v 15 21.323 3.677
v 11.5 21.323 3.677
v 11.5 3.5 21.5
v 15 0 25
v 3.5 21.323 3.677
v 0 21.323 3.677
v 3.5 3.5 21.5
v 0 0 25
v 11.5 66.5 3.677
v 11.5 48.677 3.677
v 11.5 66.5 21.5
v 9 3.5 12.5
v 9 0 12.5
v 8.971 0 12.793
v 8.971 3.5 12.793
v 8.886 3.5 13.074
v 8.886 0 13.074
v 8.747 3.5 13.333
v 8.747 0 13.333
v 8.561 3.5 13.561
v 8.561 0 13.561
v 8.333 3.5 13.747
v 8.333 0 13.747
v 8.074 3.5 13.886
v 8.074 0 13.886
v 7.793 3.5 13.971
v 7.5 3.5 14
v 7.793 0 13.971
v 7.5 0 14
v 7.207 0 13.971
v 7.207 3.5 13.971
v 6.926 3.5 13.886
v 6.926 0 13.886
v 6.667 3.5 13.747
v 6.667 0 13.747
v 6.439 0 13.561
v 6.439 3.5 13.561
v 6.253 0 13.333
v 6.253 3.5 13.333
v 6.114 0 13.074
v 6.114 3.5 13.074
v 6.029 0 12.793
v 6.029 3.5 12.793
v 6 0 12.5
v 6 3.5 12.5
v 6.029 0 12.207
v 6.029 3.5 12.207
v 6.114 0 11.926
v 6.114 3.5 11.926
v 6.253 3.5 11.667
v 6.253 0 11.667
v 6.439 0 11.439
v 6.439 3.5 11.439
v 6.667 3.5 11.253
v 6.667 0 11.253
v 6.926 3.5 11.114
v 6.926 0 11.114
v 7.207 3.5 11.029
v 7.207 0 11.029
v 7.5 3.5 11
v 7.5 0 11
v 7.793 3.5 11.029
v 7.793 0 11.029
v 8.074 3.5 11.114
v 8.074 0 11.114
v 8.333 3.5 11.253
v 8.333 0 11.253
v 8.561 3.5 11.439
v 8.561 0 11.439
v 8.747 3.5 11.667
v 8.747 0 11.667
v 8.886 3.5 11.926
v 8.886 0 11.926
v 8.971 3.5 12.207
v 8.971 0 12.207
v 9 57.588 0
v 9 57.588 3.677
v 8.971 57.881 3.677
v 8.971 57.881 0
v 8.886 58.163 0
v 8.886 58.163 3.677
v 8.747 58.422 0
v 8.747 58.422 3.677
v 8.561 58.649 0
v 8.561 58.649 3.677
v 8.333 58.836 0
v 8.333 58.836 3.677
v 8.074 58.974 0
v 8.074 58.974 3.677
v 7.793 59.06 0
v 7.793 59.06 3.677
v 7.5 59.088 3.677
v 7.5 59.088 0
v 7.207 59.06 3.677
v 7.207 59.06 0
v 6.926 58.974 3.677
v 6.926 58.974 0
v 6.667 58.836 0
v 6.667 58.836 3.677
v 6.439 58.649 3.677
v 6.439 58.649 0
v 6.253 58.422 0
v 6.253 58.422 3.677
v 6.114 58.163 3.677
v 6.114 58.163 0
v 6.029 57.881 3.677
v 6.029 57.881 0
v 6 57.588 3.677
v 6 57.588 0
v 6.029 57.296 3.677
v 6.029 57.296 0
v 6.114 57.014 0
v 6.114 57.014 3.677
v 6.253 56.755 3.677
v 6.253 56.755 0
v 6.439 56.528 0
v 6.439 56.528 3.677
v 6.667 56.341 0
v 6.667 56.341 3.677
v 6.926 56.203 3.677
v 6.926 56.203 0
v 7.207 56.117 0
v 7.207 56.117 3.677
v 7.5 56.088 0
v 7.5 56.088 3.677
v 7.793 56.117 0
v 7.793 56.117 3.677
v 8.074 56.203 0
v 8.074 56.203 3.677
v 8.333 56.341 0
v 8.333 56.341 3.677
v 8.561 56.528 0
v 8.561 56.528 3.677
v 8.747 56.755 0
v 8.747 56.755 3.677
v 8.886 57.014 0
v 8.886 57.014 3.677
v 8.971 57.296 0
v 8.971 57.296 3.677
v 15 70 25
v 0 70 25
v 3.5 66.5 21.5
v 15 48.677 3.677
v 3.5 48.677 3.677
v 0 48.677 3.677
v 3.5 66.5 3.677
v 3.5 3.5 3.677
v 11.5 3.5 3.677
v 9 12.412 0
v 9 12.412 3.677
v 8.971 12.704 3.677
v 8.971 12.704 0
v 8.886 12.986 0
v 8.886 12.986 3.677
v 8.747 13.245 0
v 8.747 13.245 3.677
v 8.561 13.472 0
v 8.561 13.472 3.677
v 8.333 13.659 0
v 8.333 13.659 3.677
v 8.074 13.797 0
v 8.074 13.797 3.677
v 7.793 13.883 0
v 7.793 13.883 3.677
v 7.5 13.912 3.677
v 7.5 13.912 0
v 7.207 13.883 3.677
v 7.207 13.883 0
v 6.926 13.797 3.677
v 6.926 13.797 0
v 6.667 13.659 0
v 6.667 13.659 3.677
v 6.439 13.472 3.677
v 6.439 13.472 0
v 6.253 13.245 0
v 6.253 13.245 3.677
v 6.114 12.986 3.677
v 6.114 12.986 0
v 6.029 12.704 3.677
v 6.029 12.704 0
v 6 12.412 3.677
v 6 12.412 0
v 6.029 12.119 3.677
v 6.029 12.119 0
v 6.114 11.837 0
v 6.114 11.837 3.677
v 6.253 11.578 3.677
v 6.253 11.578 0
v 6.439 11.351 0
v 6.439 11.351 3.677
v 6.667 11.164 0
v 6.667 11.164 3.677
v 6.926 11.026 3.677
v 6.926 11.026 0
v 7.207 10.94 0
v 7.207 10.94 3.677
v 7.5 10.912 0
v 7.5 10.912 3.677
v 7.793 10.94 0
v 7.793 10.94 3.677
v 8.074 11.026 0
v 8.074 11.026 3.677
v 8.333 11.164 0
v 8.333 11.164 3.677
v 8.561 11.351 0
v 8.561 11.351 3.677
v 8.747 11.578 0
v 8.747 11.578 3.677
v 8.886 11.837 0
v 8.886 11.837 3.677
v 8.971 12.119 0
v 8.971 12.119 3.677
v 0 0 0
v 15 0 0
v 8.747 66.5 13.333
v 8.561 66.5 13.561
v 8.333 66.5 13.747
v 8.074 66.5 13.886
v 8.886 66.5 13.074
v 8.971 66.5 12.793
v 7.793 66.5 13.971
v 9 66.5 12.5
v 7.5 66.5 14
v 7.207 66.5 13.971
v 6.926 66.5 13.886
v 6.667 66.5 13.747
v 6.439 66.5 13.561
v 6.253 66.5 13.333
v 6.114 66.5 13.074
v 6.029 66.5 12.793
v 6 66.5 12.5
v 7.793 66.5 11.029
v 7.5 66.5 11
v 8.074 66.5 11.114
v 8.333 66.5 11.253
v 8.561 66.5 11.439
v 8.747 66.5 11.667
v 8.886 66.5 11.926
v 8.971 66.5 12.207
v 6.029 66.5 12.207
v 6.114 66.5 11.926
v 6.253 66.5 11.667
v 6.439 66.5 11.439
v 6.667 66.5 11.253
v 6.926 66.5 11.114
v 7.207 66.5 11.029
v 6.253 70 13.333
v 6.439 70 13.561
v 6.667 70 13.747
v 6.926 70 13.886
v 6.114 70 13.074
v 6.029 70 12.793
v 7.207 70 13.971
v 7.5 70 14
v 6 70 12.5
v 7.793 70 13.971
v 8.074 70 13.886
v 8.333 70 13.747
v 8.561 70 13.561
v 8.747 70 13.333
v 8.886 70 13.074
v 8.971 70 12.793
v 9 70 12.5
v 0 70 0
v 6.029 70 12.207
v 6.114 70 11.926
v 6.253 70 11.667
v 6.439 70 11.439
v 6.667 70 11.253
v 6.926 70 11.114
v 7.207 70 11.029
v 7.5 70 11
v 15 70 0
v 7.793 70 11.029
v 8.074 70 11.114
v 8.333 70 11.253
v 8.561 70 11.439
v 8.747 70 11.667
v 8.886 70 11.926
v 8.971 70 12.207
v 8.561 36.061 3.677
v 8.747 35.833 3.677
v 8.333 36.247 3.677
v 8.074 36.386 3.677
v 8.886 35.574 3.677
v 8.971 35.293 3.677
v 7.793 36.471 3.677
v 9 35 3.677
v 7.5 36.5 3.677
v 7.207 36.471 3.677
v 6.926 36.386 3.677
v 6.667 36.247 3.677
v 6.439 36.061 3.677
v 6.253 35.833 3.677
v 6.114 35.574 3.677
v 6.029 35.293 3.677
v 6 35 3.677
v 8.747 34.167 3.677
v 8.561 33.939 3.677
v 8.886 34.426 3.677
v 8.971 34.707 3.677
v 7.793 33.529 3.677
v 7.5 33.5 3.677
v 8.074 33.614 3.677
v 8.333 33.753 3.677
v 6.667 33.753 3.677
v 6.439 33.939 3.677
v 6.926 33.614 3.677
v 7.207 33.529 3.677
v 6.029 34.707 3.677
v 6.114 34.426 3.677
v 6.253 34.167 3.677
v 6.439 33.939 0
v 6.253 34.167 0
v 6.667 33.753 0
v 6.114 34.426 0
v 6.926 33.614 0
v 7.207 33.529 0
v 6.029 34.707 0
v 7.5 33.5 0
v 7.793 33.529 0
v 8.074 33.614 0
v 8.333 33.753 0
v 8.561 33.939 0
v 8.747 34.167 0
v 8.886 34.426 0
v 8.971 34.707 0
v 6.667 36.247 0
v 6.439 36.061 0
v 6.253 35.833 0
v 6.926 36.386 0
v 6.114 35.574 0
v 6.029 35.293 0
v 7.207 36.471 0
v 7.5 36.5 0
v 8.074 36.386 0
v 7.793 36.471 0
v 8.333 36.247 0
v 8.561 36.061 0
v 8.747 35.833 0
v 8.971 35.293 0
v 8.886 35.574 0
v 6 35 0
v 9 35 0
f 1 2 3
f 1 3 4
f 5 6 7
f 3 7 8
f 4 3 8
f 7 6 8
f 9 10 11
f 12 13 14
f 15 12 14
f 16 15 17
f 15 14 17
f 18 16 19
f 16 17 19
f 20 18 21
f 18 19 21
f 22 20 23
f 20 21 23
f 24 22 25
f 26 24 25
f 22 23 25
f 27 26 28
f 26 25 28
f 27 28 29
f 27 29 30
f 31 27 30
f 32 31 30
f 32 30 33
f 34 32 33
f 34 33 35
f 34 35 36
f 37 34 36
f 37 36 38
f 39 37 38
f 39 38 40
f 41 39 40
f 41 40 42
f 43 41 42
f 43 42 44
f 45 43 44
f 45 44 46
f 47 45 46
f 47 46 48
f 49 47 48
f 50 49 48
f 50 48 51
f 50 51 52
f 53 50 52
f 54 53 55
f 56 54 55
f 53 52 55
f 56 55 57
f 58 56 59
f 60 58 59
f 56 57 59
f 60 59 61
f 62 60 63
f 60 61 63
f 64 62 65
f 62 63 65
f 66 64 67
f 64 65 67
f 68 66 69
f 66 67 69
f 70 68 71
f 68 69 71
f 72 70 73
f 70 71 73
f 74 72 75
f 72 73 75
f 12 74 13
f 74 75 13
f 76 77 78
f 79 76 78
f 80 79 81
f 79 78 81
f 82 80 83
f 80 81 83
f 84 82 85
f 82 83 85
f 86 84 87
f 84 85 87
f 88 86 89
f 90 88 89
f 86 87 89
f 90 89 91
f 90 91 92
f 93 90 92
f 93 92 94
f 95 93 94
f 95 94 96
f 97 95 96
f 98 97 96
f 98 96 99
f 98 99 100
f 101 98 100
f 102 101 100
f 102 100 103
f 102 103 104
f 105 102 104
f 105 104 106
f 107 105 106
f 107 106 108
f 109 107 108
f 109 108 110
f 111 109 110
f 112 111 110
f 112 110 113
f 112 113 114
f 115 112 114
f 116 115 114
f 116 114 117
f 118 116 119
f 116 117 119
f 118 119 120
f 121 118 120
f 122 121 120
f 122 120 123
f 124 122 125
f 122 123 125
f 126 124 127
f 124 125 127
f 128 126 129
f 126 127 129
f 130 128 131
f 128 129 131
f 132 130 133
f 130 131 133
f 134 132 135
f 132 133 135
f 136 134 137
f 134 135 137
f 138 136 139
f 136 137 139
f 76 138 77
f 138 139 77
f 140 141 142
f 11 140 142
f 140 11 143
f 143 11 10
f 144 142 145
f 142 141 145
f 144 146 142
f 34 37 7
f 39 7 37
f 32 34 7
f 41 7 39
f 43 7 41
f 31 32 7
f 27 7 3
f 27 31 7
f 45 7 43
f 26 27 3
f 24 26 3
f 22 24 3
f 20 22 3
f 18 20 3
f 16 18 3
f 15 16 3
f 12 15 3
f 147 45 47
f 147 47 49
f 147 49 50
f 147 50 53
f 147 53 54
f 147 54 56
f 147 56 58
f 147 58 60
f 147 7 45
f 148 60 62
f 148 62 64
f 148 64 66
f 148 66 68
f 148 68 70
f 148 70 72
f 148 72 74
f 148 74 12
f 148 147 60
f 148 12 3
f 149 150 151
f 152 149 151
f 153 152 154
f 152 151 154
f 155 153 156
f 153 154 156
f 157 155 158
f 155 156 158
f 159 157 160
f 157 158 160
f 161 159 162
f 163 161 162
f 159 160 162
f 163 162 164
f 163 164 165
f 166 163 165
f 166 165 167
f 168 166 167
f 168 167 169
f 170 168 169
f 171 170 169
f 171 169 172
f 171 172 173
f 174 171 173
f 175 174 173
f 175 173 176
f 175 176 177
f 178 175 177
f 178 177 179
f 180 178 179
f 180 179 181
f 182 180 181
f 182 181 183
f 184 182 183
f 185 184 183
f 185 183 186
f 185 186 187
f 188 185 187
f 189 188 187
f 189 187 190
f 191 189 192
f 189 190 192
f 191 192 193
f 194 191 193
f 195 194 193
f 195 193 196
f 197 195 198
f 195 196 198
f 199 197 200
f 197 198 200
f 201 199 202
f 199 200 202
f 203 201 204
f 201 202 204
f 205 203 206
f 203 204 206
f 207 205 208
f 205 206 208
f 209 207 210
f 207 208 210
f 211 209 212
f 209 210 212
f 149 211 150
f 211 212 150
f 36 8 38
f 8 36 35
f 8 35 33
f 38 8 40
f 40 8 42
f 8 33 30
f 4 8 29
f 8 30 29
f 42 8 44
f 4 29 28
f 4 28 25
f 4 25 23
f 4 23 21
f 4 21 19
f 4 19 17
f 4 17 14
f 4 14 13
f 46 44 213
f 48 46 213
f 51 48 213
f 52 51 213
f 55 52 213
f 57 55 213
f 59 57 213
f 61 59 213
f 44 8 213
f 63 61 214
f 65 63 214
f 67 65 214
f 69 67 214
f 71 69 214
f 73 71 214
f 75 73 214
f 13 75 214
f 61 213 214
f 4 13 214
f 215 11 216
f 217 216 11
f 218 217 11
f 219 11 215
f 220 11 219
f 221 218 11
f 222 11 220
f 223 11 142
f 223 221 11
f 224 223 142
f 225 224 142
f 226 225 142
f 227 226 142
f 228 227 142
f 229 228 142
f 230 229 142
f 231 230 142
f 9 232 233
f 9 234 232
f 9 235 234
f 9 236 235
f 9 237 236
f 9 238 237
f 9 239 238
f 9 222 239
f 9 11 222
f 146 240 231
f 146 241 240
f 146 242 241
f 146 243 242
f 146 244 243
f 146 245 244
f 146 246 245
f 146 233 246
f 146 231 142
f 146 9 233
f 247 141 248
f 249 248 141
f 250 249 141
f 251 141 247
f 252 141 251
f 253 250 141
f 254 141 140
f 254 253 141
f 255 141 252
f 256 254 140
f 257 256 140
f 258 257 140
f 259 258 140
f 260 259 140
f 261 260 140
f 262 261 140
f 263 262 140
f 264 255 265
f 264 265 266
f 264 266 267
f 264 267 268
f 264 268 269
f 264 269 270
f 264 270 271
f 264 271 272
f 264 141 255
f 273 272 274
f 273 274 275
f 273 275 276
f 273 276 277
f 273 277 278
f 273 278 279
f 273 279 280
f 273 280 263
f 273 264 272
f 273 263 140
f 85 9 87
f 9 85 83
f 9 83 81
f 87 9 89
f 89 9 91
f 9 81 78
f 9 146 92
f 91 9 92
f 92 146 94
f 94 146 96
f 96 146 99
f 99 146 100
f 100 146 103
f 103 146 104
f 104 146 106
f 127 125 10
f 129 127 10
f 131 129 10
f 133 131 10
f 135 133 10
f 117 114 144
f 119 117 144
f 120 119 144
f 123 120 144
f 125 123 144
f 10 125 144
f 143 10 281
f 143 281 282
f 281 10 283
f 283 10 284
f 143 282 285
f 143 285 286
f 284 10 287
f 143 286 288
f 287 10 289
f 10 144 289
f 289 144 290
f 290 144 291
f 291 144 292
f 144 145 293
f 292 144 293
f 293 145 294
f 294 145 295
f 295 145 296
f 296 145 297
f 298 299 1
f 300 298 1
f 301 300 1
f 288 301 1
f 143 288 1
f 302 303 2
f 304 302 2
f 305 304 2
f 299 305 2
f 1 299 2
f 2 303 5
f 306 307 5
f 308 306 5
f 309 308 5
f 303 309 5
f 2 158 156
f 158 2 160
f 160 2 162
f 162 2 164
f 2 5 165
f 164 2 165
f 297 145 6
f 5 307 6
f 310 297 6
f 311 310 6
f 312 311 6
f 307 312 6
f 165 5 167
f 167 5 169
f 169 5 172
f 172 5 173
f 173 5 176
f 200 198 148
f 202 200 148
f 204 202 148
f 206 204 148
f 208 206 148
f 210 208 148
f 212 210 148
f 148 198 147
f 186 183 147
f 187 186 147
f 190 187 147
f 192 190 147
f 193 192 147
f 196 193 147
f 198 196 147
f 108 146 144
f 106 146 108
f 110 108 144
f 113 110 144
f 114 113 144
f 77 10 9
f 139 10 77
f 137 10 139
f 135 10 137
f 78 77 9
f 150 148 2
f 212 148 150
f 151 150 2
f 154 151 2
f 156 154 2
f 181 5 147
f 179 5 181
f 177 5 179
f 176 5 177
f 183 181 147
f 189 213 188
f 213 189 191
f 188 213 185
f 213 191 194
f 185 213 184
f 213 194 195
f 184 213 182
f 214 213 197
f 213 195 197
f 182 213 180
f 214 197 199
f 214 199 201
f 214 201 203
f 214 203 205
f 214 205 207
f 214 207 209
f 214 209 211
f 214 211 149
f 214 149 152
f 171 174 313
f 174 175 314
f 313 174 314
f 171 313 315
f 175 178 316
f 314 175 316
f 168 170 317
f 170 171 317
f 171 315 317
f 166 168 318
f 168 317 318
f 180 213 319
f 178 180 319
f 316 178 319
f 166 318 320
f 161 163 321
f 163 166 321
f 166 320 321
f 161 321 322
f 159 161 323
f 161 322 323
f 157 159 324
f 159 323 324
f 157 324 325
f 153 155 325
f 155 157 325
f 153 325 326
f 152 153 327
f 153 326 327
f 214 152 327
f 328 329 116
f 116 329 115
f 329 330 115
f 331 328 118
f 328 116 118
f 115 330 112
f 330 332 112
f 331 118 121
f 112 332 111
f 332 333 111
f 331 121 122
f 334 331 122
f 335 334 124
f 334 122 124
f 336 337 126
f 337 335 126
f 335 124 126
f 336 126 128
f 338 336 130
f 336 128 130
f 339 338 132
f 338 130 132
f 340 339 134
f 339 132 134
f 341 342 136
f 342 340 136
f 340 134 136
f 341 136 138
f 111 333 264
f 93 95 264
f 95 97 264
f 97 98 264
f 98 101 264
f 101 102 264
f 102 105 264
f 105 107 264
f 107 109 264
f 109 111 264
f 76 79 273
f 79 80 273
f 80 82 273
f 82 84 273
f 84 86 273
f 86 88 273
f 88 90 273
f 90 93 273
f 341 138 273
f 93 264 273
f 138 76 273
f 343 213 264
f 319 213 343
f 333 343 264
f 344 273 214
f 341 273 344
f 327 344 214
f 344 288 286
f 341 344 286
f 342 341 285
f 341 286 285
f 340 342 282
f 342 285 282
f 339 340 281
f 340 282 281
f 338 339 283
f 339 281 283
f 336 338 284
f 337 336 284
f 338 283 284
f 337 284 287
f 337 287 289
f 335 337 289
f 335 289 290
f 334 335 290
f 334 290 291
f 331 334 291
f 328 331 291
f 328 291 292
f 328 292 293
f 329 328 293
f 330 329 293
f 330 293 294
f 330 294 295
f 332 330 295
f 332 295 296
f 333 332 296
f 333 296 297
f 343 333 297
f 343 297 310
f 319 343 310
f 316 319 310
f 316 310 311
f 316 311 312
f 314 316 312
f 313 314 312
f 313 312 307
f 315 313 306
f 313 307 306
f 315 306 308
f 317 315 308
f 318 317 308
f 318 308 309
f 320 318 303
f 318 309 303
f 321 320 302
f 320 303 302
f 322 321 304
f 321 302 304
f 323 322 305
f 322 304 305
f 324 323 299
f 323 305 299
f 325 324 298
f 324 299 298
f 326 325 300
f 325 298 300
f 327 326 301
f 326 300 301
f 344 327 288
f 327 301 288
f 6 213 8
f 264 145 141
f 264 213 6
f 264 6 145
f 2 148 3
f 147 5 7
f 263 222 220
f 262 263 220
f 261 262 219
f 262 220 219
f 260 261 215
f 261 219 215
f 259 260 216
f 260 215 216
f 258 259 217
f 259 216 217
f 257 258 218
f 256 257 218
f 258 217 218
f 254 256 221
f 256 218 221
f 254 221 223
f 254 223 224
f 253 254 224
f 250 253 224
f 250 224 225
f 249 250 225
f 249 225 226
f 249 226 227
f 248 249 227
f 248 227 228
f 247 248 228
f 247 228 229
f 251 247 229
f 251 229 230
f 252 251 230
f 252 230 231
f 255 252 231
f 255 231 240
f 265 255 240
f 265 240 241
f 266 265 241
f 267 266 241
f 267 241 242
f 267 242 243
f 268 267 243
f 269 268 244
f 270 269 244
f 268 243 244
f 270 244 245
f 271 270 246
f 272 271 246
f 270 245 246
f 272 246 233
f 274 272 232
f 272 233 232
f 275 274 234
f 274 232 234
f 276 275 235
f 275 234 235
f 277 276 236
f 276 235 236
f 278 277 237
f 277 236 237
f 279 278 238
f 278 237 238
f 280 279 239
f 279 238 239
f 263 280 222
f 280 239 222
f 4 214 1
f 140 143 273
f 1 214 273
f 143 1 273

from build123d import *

# Parameters (mm, degrees)
F0_W     = 15
F0_H     = 70
F1_DEPTH = 25
F3_DEPTH = 25
F5_DEPTH = 25
F6_R     = 1.5
F7_DEPTH = 83.8
F8_R     = 1.5
F9_DEPTH = 25


with BuildPart() as f1:
    # F0 (on Top) → F1 (new body)
    with BuildSketch(Plane.XY):
        with Locations((7.5, 35)):
            Rectangle(F0_W, F0_H)
    extrude(amount=F1_DEPTH)

    # F2 (on face) → F3 (cut)
    with BuildSketch(Plane(origin=(0, 0, 0), x_dir=(0, -1, 0), z_dir=(-1, 0, 0))):
        Polygon((-35, 25), (-70, 25), (-48.676951, 3.676951), (-35, 3.676951), (-21.323049, 3.676951), (0, 25), align=None)
    extrude(amount=-F3_DEPTH, mode=Mode.SUBTRACT)

    # F4 (on face) → F5 (cut)
    with BuildSketch(Plane.XY.offset(3.676951)):
        Polygon((3.5, 66.5), (3.5, 35), (3.5, 3.5), (11.5, 3.5), (11.5, 35), (11.5, 66.5), align=None)
    extrude(amount=F5_DEPTH, mode=Mode.SUBTRACT)

    # F6 (on face) → F7 (cut)
    with BuildSketch(Plane.XZ):
        with Locations((7.5, 12.5)):
            Circle(F6_R)
    extrude(amount=-F7_DEPTH, mode=Mode.SUBTRACT)

    # F8 (on face) → F9 (cut)
    with BuildSketch(Plane.XY.offset(3.676951)):
        with Locations((7.5, 57.588476)):
            Circle(F8_R)
        with Locations((7.5, 12.411524)):
            Circle(F8_R)
        with Locations((7.5, 35)):
            Circle(F8_R)
    extrude(amount=-F9_DEPTH, mode=Mode.SUBTRACT)


solid = f1.part
